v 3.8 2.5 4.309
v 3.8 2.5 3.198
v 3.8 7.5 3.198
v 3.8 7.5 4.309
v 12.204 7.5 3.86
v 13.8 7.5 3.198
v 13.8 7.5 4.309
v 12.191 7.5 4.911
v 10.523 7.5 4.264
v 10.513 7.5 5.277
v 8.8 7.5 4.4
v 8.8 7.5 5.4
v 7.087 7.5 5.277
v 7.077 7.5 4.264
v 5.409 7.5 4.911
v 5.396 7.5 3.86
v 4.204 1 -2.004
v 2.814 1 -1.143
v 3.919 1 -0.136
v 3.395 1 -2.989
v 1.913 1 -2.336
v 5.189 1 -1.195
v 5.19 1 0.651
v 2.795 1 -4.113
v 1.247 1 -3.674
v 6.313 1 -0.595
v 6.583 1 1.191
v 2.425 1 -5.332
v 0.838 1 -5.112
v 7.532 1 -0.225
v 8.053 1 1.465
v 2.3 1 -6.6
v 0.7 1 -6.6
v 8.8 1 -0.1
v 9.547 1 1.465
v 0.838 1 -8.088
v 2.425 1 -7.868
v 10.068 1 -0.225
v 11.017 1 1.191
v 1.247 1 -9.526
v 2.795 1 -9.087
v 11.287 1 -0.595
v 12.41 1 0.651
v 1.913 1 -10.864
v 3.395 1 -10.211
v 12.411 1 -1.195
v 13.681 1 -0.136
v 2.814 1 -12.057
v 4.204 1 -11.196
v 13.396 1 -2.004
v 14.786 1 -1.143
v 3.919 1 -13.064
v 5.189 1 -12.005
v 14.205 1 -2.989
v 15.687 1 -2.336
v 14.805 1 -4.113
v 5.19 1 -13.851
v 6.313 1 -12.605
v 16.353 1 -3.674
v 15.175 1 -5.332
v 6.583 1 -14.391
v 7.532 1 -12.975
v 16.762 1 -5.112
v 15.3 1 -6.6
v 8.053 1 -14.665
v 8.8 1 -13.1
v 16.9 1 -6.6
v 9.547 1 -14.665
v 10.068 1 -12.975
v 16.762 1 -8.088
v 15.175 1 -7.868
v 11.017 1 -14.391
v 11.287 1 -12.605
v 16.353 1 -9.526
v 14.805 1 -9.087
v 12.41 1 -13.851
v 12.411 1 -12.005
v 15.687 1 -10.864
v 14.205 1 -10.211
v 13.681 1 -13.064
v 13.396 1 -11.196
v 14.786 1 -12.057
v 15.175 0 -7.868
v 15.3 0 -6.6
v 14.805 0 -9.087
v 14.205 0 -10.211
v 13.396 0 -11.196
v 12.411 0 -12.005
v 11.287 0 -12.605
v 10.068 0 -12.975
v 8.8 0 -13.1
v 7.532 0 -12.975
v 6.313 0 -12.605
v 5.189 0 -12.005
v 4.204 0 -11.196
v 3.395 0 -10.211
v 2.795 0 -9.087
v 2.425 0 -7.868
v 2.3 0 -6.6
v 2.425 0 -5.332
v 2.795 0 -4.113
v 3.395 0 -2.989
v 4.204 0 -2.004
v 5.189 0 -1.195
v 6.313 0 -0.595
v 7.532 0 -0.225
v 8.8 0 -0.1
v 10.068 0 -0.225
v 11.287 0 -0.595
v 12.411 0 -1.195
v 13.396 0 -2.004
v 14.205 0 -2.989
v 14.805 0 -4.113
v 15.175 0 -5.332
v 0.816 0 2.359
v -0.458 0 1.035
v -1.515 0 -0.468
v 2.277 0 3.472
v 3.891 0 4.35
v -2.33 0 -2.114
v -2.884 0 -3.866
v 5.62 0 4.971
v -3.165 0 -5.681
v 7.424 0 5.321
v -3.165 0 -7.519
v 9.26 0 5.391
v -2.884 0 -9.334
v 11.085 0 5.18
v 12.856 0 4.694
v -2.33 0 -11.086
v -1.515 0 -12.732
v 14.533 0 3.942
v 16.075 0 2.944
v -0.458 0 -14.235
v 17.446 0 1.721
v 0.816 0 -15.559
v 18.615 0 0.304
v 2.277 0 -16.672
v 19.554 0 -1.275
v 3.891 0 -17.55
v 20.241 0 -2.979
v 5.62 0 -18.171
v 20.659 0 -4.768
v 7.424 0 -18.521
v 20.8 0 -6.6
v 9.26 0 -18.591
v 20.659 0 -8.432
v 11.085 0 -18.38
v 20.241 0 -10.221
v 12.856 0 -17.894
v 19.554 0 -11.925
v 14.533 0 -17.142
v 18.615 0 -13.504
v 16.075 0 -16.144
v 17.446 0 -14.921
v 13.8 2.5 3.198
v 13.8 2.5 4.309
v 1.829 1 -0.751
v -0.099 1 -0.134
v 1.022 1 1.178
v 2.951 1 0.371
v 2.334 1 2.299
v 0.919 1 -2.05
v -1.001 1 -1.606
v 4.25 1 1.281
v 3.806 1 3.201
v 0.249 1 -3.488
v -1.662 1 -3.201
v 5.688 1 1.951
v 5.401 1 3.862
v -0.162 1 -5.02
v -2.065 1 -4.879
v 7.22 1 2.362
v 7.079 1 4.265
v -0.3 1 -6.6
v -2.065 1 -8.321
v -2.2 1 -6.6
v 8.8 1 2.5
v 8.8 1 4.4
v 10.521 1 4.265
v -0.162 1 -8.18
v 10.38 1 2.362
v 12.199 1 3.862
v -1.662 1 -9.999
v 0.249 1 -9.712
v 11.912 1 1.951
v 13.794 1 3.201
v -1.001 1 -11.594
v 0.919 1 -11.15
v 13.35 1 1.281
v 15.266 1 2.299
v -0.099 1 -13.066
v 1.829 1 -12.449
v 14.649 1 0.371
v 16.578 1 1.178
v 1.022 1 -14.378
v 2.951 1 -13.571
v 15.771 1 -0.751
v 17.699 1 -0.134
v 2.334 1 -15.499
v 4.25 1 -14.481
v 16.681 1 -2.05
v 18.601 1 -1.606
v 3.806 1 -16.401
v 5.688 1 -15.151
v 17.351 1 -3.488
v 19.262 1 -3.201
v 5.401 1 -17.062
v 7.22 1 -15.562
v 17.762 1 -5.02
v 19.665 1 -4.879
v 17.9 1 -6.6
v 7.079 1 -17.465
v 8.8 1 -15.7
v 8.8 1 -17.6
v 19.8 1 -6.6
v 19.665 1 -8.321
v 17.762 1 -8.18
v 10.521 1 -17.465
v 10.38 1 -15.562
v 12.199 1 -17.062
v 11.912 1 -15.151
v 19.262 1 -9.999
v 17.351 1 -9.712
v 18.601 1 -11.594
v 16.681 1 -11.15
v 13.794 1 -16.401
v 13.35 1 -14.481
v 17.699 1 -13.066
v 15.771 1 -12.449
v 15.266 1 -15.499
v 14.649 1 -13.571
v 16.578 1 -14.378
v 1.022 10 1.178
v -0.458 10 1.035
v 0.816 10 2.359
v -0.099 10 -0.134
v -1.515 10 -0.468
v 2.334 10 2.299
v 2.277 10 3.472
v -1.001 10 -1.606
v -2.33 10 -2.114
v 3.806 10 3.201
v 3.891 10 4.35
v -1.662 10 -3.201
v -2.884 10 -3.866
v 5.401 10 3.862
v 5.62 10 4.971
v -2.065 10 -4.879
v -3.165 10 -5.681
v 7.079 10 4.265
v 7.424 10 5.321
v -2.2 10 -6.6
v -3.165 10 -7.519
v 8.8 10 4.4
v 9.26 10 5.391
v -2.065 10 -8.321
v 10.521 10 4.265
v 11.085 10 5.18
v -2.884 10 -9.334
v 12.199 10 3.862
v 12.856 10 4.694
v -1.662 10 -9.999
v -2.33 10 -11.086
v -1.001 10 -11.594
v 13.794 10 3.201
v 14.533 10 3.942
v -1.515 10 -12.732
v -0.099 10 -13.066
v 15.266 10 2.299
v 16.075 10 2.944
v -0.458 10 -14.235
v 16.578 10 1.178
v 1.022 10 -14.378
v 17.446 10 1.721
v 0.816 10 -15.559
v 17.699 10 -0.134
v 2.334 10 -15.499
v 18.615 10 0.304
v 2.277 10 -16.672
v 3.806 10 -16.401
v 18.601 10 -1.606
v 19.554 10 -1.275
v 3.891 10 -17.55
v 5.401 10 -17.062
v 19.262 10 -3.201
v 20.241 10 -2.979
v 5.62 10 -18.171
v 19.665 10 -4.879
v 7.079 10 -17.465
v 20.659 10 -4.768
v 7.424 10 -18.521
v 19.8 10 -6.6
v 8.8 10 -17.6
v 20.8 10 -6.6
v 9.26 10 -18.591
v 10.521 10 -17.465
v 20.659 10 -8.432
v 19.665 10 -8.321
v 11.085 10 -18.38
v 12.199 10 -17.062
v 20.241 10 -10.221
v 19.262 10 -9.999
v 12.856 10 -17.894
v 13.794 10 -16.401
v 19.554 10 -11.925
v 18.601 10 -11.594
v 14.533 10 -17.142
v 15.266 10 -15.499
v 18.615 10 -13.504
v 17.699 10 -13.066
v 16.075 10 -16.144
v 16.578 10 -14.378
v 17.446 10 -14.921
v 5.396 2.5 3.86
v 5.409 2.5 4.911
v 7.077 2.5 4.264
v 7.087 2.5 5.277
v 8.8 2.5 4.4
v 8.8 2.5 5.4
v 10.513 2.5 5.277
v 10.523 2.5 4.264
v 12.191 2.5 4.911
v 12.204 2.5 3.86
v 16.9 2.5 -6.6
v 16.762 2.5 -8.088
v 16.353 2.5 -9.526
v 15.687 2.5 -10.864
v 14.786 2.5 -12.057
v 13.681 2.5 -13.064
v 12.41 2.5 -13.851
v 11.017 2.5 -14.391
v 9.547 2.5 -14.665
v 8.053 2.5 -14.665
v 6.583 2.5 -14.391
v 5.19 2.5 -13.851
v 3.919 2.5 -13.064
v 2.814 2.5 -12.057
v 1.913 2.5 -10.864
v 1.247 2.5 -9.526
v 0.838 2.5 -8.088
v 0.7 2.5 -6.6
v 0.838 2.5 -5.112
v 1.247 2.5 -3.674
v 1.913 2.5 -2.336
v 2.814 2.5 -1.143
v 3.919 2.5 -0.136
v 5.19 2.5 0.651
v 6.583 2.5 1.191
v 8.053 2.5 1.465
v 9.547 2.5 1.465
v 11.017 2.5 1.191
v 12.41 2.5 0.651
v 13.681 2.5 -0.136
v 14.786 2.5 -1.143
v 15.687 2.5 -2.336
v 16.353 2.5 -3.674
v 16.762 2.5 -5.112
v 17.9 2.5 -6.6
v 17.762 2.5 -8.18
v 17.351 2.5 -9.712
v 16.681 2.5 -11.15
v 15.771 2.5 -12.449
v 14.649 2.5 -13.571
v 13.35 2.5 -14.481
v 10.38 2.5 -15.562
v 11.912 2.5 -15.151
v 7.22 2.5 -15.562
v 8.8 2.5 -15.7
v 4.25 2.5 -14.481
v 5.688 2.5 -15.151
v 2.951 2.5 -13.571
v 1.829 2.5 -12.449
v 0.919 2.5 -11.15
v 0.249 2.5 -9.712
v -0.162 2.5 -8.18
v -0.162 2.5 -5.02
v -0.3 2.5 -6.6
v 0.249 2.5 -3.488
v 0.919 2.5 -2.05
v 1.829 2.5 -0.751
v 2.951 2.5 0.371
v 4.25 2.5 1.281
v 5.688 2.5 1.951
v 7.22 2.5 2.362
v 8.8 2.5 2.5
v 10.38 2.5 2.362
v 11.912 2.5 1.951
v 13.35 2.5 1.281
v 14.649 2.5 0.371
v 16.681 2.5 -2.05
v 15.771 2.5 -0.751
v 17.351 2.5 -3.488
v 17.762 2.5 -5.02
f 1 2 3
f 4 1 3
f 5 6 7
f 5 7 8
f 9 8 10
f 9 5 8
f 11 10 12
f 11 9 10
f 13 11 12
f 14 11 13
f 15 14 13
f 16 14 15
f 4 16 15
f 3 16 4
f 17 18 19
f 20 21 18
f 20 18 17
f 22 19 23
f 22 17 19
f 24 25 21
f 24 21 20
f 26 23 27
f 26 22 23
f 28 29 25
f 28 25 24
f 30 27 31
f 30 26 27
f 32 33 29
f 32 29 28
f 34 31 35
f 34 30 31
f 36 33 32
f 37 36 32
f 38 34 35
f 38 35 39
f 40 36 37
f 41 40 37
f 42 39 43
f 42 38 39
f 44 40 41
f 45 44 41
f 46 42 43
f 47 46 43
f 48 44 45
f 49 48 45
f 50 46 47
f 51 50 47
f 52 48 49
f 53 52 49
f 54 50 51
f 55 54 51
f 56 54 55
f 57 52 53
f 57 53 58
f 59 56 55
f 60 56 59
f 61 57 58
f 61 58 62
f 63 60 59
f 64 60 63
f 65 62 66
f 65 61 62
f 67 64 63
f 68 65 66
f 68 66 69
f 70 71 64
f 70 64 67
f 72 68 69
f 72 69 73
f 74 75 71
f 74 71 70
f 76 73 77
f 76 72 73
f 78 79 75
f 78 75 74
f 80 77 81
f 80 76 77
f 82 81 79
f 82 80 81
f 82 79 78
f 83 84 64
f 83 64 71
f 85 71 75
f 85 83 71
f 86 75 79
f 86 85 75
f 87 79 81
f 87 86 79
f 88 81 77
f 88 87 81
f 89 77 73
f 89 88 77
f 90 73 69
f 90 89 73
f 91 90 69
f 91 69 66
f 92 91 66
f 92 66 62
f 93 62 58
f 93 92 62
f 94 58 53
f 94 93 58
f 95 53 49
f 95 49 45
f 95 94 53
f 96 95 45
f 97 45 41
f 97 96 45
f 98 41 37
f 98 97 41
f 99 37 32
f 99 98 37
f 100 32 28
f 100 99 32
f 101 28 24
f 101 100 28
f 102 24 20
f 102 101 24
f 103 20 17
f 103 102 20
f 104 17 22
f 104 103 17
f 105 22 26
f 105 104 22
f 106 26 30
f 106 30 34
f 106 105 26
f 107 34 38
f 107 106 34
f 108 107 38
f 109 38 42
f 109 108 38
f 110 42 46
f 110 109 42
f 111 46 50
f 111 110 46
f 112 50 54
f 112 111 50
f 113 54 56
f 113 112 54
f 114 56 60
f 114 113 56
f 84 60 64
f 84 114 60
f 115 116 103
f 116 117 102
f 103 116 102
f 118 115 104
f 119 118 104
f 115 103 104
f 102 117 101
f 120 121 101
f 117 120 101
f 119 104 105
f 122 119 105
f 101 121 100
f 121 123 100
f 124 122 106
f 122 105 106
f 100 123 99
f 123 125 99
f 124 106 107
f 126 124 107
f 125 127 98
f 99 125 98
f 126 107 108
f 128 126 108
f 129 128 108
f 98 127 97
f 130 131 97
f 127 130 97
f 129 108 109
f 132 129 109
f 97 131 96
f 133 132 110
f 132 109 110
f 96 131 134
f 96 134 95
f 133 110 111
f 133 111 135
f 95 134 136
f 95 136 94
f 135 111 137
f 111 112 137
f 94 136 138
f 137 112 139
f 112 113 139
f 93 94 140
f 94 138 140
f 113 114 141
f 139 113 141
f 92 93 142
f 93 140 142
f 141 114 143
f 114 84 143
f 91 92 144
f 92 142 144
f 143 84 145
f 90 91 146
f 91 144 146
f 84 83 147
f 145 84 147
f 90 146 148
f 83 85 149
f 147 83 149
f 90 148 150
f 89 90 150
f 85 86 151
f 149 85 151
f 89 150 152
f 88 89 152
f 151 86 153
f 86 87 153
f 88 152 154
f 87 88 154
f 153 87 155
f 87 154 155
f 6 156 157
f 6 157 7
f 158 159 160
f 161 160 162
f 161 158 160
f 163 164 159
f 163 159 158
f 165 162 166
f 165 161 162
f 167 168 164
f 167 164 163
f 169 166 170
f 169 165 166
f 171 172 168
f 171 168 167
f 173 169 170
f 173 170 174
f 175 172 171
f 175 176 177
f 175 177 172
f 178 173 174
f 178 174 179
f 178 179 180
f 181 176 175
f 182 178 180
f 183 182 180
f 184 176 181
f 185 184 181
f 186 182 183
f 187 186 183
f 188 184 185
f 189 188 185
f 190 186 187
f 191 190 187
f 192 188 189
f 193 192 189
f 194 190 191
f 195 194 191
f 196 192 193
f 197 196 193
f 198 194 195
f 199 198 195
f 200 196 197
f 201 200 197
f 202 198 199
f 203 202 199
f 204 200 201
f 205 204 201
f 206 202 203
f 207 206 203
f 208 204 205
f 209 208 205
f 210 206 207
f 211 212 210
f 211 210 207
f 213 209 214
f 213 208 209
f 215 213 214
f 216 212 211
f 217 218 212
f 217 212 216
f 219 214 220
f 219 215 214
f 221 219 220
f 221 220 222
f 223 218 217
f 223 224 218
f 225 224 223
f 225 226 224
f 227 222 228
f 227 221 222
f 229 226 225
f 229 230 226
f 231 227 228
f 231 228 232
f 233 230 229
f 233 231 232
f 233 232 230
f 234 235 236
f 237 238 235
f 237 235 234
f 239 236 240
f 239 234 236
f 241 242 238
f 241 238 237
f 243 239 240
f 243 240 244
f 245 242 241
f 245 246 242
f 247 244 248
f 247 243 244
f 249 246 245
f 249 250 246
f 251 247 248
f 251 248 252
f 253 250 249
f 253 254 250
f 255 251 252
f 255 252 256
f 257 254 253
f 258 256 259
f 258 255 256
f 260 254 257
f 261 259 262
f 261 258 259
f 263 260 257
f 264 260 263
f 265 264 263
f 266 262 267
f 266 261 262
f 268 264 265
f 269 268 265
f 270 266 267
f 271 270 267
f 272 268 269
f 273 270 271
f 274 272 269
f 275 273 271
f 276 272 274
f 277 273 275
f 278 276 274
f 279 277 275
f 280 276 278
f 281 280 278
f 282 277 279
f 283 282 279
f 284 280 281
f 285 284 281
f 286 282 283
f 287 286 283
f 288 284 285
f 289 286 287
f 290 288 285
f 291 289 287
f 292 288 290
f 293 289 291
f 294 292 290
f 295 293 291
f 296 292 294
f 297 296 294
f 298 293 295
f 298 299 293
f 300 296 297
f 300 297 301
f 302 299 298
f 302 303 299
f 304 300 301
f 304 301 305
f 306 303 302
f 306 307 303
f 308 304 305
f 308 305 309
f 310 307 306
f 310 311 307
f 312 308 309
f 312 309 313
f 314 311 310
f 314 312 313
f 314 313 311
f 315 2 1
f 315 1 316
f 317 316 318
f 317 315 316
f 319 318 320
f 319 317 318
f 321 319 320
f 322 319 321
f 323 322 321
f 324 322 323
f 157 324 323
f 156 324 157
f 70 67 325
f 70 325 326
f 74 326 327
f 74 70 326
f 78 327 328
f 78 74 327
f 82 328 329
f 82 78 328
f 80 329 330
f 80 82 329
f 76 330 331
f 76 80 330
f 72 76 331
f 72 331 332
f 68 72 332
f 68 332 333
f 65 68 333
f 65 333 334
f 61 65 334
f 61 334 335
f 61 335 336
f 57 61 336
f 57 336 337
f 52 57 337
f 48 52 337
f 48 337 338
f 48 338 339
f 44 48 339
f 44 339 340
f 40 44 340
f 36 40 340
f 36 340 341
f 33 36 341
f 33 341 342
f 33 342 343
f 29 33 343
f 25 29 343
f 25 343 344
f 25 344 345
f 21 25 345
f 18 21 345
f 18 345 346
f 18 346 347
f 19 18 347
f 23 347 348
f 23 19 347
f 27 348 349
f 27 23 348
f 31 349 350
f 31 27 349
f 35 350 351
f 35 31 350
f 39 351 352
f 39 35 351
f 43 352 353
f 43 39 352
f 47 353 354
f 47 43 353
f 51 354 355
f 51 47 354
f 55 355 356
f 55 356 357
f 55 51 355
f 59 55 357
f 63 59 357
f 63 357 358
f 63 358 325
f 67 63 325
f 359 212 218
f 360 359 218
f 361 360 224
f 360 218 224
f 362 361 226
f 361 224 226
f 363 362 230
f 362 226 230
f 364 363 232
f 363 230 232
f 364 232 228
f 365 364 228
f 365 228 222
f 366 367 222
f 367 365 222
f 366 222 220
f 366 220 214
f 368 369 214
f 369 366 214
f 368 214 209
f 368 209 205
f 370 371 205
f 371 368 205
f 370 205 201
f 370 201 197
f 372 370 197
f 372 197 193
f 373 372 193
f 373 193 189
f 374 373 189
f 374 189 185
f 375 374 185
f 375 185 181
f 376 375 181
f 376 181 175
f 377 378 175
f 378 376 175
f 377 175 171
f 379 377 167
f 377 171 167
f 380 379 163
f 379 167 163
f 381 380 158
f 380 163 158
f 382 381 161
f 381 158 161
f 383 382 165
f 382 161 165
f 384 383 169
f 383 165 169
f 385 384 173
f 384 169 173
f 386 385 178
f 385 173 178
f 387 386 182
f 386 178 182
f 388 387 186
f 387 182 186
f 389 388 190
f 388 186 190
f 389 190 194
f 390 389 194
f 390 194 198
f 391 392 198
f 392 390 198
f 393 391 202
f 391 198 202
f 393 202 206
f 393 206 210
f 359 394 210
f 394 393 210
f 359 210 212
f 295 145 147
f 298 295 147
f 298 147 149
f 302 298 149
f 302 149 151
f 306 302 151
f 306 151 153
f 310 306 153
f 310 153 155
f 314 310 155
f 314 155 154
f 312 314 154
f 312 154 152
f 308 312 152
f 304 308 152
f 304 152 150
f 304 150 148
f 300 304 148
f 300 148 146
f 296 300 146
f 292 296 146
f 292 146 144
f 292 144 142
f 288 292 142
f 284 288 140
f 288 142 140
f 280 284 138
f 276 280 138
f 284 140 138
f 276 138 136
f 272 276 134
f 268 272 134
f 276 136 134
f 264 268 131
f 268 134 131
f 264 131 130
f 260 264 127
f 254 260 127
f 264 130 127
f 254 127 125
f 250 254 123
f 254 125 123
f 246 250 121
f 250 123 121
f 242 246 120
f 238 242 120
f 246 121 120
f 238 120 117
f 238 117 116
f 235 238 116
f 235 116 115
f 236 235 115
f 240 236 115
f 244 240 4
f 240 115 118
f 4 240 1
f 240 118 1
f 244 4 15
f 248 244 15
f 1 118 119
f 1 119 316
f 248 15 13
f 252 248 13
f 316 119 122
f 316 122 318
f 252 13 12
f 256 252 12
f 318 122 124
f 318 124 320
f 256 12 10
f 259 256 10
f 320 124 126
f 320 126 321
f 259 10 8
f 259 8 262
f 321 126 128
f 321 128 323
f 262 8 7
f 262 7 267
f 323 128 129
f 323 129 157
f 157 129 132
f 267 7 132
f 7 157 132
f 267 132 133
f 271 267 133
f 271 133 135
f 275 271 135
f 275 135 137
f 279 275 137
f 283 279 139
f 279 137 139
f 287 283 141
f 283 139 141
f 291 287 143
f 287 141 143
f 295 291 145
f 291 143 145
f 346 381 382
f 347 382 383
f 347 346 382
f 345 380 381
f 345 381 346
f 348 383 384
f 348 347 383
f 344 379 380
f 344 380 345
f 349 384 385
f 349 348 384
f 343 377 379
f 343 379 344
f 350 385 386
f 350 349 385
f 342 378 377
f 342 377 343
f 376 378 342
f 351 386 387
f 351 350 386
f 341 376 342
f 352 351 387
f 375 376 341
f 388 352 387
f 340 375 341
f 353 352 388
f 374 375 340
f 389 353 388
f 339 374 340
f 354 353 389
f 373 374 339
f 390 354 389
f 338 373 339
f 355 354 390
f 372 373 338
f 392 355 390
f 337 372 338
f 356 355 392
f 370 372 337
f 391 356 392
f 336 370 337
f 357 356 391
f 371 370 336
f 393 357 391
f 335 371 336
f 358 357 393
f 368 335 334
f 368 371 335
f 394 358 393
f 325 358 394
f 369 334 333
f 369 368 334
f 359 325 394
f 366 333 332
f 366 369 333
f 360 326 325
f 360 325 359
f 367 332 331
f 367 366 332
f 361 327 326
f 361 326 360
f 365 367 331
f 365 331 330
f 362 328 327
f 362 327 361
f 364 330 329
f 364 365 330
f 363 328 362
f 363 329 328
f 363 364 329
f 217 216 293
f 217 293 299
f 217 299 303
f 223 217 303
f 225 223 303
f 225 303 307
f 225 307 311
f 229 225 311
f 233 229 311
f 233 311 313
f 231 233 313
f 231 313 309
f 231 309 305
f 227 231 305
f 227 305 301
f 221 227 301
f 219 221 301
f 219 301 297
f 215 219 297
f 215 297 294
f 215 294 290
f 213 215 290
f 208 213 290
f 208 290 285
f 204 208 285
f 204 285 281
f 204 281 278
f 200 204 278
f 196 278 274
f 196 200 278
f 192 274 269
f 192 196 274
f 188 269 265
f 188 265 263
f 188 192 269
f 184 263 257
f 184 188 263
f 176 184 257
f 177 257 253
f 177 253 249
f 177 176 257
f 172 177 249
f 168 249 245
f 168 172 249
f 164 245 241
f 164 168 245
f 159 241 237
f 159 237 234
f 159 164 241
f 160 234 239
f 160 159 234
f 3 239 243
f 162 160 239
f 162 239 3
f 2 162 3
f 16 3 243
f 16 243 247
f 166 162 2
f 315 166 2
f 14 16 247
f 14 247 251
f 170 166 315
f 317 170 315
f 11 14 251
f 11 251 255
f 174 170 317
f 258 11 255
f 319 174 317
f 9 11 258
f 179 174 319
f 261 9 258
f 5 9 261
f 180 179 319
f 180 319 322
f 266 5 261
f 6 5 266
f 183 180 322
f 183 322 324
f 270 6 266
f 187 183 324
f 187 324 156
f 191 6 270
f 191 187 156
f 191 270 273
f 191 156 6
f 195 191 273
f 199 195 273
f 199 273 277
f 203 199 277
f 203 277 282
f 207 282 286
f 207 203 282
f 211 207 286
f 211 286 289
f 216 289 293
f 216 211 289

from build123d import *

# Parameters (mm, degrees)
CROQUIS1_R              = 11
CROQUIS1_R_2            = 6.5
SALIENTE_EXTRUIR2_DEPTH = 1
CROQUIS1_6_R            = 9.1
CROQUIS1_6_R_2          = 8.1
SALIENTE_EXTRUIR3_DEPTH = 2.5
CROQUIS1_8_R            = 12
CROQUIS1_8_R_2          = 11
SALIENTE_EXTRUIR4_DEPTH = 10
CROQUIS10_W             = 10
CROQUIS10_H             = 5
CORTAR_EXTRUIR1_DEPTH   = 30


with BuildPart() as part:
    # Croquis1 → Saliente-Extruir2 (new body)
    with BuildSketch(Plane(origin=(0, 0, 0), x_dir=(1, 0, 0), z_dir=(0, 1, 0))):
        with Locations((8.8, 6.6)):
            Circle(CROQUIS1_R)
        with Locations((8.8, 6.6)):
            Circle(CROQUIS1_R_2, mode=Mode.SUBTRACT)
    extrude(amount=SALIENTE_EXTRUIR2_DEPTH)

    # Croquis1<6> → Saliente-Extruir3 (add)
    with BuildSketch(Plane(origin=(0, 0, 0), x_dir=(1, 0, 0), z_dir=(0, 1, 0))):
        with Locations((8.8, 6.6)):
            Circle(CROQUIS1_6_R)
        with Locations((8.8, 6.6)):
            Circle(CROQUIS1_6_R_2, mode=Mode.SUBTRACT)
    extrude(amount=SALIENTE_EXTRUIR3_DEPTH)

    # Croquis1<8> → Saliente-Extruir4 (add)
    with BuildSketch(Plane(origin=(0, 0, 0), x_dir=(1, 0, 0), z_dir=(0, 1, 0))):
        with Locations((8.8, 6.6)):
            Circle(CROQUIS1_8_R)
        with Locations((8.8, 6.6)):
            Circle(CROQUIS1_8_R_2, mode=Mode.SUBTRACT)
    extrude(amount=SALIENTE_EXTRUIR4_DEPTH)

    # Croquis10 → Cortar-Extruir1 (cut)
    with BuildSketch(Plane.XY):
        with Locations((8.8, 5)):
            Rectangle(CROQUIS10_W, CROQUIS10_H)
    extrude(amount=CORTAR_EXTRUIR1_DEPTH, mode=Mode.SUBTRACT)


solid = part.part
